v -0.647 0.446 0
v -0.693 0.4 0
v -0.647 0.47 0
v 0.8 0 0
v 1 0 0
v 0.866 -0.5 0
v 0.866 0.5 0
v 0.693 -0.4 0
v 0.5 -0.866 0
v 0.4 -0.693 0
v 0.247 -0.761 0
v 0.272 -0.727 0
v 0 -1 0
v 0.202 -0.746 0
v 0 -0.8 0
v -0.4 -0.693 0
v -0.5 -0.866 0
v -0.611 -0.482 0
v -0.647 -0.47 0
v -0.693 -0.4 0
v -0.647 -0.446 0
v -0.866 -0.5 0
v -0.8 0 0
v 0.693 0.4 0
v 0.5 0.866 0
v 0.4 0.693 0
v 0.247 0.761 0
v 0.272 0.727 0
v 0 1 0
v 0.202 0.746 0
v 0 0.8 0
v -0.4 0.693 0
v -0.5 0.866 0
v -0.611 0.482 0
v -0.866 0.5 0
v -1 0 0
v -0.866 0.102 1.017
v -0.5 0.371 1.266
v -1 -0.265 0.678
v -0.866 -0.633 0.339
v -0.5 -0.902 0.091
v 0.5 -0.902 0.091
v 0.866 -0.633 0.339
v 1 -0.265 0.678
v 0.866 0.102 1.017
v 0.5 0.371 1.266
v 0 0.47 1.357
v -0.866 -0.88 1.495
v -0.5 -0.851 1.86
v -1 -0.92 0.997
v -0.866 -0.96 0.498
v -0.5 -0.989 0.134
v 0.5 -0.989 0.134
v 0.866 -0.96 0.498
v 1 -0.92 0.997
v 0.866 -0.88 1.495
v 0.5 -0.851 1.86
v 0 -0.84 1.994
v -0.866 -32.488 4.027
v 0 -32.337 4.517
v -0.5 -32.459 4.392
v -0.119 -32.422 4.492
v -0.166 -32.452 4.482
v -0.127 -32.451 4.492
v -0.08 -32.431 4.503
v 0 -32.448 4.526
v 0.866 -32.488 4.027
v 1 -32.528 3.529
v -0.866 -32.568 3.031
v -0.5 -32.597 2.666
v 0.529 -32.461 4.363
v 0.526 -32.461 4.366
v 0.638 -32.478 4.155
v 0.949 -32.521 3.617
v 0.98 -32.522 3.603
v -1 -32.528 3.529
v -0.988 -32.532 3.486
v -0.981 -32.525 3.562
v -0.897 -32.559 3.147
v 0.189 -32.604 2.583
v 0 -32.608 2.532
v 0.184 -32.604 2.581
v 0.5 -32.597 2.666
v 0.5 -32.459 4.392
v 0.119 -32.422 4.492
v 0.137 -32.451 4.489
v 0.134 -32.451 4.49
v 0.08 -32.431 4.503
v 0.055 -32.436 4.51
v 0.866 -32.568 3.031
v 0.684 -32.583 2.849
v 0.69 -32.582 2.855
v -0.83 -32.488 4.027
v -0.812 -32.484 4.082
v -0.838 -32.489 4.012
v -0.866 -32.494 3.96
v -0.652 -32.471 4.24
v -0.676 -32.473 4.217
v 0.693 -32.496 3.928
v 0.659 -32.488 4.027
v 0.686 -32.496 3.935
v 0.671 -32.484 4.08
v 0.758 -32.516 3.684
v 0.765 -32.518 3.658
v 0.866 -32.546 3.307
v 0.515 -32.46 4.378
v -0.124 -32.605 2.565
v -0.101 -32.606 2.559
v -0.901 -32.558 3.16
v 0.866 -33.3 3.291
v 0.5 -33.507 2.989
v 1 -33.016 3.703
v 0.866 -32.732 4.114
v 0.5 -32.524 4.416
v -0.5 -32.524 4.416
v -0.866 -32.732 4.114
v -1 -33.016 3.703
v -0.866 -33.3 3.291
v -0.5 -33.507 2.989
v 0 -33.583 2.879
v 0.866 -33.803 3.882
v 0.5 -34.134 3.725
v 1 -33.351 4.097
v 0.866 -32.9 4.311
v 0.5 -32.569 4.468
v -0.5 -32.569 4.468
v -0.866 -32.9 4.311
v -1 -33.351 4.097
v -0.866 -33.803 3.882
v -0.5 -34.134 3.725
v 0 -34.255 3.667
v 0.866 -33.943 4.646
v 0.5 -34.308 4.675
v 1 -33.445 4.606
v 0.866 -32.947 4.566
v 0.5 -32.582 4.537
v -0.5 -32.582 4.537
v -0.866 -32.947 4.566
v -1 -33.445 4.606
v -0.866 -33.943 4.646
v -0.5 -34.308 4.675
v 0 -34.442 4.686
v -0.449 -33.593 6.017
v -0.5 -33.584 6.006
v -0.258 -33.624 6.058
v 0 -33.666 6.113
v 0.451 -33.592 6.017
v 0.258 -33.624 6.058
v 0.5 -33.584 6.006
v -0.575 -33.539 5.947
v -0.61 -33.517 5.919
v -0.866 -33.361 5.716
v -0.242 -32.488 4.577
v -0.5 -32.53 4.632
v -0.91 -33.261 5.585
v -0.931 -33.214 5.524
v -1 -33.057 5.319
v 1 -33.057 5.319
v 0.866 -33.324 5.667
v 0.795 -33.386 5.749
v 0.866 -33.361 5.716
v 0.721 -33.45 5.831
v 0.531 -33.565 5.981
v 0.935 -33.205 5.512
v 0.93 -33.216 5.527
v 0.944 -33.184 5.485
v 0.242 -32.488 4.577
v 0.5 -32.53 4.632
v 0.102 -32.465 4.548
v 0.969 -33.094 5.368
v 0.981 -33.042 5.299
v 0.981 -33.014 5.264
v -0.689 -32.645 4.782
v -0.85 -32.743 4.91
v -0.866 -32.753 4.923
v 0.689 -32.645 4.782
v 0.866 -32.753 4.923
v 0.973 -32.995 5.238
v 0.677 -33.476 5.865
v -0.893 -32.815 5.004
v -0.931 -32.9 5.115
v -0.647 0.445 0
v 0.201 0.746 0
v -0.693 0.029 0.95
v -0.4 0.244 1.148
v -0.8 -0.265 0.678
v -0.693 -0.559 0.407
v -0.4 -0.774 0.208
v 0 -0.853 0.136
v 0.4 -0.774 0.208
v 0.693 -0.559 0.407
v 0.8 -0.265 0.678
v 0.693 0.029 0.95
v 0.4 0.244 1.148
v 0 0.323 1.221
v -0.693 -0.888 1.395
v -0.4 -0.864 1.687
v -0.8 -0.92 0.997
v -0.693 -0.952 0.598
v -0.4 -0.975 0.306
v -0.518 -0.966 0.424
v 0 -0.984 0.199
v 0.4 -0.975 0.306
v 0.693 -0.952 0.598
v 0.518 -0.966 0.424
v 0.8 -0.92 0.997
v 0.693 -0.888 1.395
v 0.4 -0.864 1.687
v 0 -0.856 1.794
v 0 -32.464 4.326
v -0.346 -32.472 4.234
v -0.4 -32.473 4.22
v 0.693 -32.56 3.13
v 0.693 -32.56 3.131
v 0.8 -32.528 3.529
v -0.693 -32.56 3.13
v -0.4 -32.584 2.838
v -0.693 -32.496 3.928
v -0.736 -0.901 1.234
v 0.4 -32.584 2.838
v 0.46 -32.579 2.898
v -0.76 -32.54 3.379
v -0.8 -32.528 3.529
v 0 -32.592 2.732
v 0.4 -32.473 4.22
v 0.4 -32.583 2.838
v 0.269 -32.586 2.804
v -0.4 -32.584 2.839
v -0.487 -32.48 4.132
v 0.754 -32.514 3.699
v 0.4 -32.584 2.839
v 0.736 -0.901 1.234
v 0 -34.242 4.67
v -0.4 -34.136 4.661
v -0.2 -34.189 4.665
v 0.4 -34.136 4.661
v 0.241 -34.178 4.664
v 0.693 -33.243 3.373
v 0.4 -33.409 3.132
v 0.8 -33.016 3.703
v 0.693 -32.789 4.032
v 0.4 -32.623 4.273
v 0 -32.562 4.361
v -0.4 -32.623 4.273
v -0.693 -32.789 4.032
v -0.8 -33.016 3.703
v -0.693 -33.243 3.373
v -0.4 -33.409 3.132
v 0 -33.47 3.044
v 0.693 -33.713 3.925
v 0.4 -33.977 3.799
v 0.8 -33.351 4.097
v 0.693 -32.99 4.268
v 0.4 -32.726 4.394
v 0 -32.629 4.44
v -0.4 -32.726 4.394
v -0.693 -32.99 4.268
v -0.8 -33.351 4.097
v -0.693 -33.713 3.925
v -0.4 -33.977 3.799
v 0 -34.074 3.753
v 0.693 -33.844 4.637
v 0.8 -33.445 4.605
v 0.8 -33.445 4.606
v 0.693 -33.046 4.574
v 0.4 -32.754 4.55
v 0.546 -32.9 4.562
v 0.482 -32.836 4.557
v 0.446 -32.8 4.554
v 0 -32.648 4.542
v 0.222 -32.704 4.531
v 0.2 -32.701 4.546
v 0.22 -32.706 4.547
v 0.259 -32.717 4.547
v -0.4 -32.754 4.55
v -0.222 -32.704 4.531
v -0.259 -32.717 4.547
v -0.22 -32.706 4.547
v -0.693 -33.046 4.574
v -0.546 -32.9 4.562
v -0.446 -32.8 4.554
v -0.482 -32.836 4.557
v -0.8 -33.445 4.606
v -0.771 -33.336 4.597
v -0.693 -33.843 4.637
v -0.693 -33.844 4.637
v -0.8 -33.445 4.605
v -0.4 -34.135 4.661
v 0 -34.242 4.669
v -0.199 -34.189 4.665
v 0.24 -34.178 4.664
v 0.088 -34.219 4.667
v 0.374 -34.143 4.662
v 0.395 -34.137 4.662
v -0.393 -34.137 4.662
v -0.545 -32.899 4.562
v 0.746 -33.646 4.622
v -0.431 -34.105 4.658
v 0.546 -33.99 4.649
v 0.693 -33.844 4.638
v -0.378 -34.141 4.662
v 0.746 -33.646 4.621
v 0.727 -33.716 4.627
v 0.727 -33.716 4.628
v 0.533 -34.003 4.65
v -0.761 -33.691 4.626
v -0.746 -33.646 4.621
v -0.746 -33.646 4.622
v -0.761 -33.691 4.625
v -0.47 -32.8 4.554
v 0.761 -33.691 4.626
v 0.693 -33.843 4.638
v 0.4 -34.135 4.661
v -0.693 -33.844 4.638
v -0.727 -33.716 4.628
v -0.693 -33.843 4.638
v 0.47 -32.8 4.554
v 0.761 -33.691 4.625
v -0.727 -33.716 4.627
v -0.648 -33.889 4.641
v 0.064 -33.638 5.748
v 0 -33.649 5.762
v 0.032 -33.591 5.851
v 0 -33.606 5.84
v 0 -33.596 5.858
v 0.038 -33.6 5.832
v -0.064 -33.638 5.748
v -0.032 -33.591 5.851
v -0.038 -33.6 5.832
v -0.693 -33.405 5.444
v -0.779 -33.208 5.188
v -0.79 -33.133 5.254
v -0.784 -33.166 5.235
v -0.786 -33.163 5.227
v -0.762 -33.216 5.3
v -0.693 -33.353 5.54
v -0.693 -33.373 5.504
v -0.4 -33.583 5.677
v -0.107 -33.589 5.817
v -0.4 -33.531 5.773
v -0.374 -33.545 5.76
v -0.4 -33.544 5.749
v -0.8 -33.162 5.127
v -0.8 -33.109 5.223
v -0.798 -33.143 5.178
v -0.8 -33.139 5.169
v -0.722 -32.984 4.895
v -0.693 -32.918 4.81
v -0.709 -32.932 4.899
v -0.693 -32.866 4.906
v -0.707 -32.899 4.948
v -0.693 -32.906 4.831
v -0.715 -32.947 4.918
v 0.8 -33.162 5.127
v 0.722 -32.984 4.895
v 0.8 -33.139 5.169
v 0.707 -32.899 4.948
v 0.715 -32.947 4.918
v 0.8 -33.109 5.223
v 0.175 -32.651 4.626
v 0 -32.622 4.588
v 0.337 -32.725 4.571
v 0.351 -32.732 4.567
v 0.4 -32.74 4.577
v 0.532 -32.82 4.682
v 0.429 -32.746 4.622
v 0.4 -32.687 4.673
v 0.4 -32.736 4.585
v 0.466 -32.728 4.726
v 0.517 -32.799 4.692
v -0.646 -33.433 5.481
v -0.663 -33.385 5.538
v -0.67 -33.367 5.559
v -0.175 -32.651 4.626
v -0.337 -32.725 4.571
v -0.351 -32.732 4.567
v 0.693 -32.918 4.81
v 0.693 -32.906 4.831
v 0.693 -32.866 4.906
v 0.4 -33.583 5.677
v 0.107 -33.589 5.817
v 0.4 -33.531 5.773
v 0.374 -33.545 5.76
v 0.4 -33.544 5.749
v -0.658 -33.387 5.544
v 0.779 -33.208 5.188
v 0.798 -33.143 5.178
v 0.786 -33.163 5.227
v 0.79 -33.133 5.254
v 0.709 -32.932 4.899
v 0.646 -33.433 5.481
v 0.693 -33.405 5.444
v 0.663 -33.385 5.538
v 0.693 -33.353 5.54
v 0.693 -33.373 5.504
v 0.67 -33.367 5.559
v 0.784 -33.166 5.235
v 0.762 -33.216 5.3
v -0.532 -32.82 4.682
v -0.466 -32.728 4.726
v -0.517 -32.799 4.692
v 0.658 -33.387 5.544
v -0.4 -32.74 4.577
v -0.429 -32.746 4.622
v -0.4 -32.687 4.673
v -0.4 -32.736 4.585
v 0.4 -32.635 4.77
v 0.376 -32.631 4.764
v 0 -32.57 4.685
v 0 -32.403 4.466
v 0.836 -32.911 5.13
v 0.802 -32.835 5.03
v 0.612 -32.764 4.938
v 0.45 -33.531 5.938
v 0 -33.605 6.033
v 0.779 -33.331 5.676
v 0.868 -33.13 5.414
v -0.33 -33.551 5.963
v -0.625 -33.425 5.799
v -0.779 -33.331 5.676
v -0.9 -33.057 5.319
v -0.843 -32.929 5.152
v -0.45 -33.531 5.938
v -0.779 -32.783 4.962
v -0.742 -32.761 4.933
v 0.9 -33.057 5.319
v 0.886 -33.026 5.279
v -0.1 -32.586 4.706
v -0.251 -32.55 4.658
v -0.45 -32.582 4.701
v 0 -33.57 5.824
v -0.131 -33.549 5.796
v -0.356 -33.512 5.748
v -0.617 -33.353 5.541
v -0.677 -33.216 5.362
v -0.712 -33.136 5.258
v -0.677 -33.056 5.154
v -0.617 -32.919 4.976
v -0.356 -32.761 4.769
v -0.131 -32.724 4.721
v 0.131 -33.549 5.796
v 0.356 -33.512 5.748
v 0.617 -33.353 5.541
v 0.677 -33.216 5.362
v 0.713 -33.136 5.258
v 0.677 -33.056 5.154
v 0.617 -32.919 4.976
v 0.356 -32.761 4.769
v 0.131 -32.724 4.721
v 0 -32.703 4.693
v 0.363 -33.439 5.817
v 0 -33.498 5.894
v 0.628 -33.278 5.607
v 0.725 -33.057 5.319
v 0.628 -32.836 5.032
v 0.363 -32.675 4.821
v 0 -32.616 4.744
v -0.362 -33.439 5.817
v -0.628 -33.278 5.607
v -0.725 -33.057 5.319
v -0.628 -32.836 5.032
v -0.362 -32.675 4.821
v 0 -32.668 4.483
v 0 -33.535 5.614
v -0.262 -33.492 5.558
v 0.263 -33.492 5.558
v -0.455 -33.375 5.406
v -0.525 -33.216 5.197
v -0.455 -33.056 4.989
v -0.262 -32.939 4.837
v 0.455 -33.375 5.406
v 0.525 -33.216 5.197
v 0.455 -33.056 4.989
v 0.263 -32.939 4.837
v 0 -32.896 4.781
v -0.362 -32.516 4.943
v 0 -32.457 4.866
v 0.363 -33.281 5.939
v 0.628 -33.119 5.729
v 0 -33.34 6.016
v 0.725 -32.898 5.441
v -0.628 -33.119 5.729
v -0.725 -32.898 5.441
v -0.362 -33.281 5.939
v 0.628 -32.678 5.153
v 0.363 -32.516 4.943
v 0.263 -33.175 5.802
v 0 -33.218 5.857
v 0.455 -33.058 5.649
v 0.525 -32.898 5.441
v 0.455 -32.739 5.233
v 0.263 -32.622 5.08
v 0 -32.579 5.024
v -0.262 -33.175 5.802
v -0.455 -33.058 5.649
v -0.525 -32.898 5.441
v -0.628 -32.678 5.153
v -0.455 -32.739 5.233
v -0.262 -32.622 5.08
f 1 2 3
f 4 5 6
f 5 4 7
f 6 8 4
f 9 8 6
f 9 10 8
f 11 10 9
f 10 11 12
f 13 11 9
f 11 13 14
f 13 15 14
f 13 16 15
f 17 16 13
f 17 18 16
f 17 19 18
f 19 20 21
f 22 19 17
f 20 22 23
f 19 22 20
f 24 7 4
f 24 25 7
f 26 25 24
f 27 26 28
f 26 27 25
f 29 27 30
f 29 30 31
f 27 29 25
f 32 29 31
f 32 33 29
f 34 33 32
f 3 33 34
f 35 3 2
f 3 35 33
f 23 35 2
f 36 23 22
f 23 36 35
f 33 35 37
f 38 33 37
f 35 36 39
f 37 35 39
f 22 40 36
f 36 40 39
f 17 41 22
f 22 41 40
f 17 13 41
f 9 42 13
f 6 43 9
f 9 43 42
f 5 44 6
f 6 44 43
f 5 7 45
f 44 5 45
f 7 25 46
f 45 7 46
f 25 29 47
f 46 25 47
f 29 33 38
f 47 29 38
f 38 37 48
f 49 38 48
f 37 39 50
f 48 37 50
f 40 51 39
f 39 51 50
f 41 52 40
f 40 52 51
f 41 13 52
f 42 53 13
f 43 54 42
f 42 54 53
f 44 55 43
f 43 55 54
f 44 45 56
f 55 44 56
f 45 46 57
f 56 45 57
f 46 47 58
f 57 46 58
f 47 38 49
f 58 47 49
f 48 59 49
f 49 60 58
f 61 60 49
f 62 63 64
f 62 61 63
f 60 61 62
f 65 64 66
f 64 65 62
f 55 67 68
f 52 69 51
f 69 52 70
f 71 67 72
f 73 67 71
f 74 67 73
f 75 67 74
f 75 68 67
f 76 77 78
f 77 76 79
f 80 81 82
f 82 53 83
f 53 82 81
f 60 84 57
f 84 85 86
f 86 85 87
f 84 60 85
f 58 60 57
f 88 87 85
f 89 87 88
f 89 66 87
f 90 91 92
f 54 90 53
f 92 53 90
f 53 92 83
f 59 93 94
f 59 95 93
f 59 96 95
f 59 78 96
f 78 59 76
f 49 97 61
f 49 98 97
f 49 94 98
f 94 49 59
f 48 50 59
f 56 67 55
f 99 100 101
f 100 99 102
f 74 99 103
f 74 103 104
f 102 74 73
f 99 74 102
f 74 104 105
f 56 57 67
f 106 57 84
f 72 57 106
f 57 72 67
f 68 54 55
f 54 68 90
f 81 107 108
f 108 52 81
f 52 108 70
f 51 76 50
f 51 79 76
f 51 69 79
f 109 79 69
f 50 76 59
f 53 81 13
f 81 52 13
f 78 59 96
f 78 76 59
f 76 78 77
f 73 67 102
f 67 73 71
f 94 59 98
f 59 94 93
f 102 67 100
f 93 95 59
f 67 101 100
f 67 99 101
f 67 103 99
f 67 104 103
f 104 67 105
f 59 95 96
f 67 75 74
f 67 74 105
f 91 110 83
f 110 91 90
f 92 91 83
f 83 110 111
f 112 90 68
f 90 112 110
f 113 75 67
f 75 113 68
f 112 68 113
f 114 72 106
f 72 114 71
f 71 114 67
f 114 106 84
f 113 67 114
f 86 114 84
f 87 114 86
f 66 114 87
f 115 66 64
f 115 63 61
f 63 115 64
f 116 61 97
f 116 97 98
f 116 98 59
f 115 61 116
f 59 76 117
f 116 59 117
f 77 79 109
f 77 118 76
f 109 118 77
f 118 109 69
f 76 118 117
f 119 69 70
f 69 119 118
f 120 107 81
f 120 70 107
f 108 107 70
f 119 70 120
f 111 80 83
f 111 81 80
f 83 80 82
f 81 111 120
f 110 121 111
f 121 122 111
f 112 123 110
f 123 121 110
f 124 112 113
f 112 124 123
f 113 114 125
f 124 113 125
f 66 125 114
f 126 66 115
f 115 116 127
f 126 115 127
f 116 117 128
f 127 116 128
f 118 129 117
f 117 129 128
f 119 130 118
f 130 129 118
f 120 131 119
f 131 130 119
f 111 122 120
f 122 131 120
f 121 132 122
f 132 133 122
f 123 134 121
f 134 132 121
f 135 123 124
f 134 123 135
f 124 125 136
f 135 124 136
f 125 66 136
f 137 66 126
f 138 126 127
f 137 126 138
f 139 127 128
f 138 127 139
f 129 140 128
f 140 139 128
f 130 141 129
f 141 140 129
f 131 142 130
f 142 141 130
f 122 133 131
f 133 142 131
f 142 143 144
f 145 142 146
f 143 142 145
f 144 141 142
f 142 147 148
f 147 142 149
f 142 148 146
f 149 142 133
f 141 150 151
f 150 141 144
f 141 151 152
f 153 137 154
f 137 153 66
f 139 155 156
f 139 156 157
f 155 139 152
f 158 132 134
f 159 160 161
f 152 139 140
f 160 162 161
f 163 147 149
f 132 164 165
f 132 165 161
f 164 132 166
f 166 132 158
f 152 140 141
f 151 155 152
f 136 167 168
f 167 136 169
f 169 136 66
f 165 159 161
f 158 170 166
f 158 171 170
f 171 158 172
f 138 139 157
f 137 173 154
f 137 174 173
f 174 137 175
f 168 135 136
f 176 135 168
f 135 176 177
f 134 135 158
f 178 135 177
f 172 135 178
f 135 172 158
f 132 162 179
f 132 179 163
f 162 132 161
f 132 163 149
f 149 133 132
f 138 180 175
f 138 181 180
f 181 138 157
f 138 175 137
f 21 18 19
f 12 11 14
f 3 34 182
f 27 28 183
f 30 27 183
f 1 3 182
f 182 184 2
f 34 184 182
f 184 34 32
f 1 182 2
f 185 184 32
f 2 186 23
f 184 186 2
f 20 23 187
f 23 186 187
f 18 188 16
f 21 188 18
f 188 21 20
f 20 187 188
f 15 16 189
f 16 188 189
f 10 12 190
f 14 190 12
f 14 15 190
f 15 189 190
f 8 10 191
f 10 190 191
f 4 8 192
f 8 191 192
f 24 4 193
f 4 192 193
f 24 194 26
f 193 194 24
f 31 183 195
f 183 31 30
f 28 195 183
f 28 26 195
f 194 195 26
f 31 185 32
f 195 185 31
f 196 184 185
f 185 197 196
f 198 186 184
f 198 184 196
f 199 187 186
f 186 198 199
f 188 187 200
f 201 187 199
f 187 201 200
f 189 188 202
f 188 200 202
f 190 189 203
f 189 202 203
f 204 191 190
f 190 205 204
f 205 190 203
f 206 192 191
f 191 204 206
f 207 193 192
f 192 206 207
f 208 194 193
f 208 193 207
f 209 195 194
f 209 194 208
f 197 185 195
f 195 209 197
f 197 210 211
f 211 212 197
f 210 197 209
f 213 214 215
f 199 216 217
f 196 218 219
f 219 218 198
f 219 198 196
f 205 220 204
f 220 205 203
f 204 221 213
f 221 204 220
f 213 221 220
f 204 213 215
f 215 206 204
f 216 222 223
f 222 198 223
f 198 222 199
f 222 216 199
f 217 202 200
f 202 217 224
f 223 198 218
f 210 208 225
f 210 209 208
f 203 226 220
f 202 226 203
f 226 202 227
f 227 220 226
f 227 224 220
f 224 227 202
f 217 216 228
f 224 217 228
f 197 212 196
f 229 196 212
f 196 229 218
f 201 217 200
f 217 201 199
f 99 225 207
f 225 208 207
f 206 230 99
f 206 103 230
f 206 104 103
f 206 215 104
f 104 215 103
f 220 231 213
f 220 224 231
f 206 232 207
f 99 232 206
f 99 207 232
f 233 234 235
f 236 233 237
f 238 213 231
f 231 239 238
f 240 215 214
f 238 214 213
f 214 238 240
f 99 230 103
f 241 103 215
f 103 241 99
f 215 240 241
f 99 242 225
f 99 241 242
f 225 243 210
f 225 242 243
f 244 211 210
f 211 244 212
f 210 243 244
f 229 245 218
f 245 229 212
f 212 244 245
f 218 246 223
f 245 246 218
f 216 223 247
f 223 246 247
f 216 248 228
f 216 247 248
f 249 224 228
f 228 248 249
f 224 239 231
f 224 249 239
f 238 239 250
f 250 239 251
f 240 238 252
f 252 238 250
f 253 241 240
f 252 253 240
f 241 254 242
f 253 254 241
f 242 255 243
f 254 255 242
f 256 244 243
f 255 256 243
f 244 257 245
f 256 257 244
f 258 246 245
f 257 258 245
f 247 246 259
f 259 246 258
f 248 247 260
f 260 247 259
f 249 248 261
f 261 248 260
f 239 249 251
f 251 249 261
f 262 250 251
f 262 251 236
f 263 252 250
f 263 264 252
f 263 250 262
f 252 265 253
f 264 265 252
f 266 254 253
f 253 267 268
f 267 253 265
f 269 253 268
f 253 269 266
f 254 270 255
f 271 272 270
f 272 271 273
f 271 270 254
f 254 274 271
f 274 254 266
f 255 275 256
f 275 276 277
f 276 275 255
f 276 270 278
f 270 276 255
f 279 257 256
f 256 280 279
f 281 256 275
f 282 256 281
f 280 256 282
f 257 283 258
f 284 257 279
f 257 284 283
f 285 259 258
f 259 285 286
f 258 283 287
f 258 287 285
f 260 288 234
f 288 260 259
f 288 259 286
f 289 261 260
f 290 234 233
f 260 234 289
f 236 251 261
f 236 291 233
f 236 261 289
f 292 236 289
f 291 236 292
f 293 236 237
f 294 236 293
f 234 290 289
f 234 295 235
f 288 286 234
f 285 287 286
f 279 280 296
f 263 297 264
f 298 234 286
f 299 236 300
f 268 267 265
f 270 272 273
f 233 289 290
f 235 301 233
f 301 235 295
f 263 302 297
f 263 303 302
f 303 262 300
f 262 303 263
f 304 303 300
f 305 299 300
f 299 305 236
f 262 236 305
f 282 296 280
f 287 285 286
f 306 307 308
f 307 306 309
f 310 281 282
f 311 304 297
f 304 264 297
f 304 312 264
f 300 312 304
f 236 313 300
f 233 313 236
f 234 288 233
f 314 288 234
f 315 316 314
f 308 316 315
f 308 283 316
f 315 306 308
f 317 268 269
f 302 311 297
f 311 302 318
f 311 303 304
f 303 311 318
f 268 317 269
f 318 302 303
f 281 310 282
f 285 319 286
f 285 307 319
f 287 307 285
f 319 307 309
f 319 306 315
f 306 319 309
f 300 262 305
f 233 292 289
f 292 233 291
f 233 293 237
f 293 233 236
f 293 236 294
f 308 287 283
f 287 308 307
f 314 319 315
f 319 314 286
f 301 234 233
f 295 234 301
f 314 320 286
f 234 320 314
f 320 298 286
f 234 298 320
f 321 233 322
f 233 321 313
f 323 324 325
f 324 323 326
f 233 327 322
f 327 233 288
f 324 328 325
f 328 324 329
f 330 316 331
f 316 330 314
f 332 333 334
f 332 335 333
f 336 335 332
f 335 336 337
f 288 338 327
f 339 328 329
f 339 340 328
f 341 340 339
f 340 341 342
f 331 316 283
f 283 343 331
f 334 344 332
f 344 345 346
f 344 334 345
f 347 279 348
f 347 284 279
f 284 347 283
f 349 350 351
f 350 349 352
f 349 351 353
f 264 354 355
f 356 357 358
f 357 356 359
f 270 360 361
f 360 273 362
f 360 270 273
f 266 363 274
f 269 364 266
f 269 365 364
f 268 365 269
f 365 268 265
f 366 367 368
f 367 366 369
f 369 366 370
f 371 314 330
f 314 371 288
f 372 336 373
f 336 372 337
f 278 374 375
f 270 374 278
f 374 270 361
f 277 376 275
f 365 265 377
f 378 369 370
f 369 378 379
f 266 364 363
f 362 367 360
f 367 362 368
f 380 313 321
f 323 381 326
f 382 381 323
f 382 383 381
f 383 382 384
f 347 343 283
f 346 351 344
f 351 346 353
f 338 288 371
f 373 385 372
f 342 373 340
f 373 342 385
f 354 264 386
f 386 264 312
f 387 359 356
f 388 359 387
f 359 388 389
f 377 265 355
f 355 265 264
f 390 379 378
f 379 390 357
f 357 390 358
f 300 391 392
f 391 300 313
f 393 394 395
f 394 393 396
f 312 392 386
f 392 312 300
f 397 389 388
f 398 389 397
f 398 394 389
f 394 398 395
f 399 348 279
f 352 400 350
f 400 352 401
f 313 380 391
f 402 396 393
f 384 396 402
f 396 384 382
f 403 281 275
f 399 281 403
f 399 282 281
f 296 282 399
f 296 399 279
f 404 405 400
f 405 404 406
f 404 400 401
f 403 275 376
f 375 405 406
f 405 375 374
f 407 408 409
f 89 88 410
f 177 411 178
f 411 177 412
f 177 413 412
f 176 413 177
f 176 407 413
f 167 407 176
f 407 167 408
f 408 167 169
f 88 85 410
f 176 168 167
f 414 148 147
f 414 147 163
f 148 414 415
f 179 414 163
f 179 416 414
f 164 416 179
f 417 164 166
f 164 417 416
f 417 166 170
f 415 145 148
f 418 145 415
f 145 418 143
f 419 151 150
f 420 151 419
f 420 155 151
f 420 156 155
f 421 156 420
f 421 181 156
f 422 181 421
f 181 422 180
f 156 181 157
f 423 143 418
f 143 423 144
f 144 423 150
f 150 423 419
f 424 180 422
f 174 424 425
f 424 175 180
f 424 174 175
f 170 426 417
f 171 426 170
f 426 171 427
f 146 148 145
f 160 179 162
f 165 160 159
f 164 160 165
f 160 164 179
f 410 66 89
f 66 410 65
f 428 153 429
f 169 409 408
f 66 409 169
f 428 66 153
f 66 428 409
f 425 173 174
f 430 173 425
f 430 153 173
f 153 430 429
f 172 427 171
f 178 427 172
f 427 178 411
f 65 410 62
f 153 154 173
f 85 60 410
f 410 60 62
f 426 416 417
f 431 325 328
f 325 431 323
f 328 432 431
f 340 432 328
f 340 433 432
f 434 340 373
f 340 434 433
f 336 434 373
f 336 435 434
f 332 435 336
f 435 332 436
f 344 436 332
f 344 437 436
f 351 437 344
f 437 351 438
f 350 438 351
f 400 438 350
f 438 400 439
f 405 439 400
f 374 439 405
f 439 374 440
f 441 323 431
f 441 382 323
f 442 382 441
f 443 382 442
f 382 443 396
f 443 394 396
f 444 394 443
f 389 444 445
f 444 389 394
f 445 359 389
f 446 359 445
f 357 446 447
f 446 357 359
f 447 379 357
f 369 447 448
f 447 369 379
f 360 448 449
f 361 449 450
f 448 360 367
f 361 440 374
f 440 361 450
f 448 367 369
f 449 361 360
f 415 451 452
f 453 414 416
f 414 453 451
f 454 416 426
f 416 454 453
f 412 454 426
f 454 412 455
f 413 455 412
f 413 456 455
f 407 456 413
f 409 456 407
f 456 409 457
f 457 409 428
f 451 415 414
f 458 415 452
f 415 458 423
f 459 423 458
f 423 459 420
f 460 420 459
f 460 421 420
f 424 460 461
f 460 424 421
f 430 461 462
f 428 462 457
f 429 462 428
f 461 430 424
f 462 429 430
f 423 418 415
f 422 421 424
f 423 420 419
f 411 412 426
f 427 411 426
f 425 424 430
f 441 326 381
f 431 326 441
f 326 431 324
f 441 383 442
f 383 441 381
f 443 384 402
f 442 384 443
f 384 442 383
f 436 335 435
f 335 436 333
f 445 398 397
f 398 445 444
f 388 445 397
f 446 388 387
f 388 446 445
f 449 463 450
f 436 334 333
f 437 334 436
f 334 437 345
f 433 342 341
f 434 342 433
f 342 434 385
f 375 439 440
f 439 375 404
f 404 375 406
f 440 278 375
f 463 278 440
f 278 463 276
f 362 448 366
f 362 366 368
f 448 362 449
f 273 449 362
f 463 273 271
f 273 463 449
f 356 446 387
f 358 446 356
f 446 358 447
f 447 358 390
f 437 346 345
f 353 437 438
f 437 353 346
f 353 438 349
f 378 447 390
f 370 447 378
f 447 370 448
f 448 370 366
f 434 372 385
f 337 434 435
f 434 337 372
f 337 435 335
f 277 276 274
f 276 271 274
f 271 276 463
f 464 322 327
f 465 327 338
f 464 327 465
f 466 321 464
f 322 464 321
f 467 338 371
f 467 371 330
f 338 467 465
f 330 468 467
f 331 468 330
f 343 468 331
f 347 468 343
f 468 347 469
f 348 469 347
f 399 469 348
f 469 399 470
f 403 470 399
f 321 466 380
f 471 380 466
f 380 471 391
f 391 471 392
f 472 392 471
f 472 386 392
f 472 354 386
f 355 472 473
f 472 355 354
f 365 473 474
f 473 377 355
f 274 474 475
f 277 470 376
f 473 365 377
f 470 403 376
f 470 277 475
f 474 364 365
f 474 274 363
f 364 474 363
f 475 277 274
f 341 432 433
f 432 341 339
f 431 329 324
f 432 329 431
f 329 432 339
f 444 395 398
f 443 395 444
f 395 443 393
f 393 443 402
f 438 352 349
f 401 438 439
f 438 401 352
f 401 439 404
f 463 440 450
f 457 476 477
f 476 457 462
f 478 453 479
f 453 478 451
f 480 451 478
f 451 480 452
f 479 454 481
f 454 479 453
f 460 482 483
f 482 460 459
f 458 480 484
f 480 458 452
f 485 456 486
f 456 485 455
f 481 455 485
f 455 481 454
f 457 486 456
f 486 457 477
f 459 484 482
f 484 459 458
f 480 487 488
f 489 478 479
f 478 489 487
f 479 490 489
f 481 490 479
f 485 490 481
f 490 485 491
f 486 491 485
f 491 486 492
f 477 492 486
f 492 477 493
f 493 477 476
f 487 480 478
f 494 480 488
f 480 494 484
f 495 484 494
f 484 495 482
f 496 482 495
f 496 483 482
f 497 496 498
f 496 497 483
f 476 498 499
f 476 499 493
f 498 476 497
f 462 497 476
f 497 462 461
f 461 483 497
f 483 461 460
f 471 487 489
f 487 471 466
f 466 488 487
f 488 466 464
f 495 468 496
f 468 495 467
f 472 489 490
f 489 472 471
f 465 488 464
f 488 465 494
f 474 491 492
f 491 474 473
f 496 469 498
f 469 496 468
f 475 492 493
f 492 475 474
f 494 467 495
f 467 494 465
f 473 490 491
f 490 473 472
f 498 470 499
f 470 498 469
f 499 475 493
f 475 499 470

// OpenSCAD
tolerance=0.075;
hole_radius=0.05;
grid_hole_radius=0.05;
outer_radius=1;
thickness=0.2;
hole_attach_height=0.05;
attach_thickness=0.1;

//parameters that don't have to be defined explicitly
eps = tolerance/100;
inner_radius = outer_radius - thickness;
fn = 12;
fnh = 6;

module angled_cylinder(angle_deg_y, _h, _r, angle_deg_x = 0) {
    rotate([angle_deg_x, angle_deg_y, 0]) { // Rotate the cylinder 
            cylinder(h = _h, r = _r, center = true, $fn = fnh);
        }
}

module hole(_h) {
    cylinder(h = _h, r = grid_hole_radius, $fn = fnh);
}

//makes circle of holes
module circular_grid(_h, _r, _n) {
    for (i = [0:_n-1]) {
        angle = i * 360 / _n;
        x_pos = _r * cos(angle);
        y_pos = _r * sin(angle);
        translate([x_pos, y_pos, -eps]) {
            hole(_h);
        }
    }
}

//makes grid of holes
module hole_grid(hole_height, grid_h) {
    translate([0,0,hole_height]) {
        difference() {
            //cylinder
            cylinder(h = grid_h, r = (inner_radius + outer_radius)/2, 
                center=false, $fn = fn);
            //holes
            for (i = [0 : grid_hole_radius * 2 + hole_attach_height : inner_radius - grid_hole_radius * 2]) {
                circular_grid(grid_h + eps*2, i, ceil(6.28*i/(grid_hole_radius*4)));
            }
            
        } 
    }
}

//makes curve of CSC
module curve(_radius, _twist, _turning_angle, _turning_radius) {
    rotate([90,0,_twist])
    translate([-_turning_radius, 0, 0])
    rotate_extrude(angle=_turning_angle, convexity=100, $fn = fn)
    translate([_turning_radius, 0]) circle(_radius);
}

module CSC(_r, _t1, _ta1, _tr1, _h, _t2, _ta2, _tr2, is_inner) {
    
    if (_ta1 > 90) {
        CSC(_r, _t1, 90, _tr1, 0, 0, 0, 0, is_inner);
        
        pos1 = (-_tr1 + sqrt(_tr1*_tr1 - pow(_tr1,2)));
        translate([pos1*cos(_t1),pos1*sin(_t1),_tr1])
        rotate([0,-90,_t1])
        CSC(_r, 0, _ta1 - 90, _tr1, _h, _t2, _ta2, _tr2, is_inner);
    } else if (_ta2 > 90) {
        CSC(_r, _t1, _ta1, _tr1, _h, _t2, 90, _tr2, is_inner);
        
        pos1 = (-_tr1 + sqrt(_tr1*_tr1 - pow(_tr1*sin(_ta1),2)));
        pos2 = (-_tr2 + sqrt(_tr2*_tr2 - pow(_tr2,2)));
        translate([pos1*cos(_t1),pos1*sin(_t1),_tr1*sin(_ta1)])
        rotate([0,-_ta1,_t1])
        translate([0, 0, _h])
        translate([pos2*cos(_t2),pos2*sin(_t2),_tr2])
        rotate([0,-90,_t2])
        CSC(_r, 0, 0, 0, 0, 0, _ta2 - 90, _tr2, is_inner);
    } else {
        //intermediate positions
        pos1 = (-_tr1 + sqrt(_tr1*_tr1 - pow(_tr1*sin(_ta1),2)));
        pos2 = (-_tr2 + sqrt(_tr2*_tr2 - pow(_tr2*sin(_ta2),2)));
        
        union() {
            //bottom shell threshold
            if (is_inner) {
                cylinder(h=eps, r=_r, center=true);
            }
            
            //first curve of CSC
            curve(_r, _t1, _ta1, _tr1);
            
            //straight link of CSC
            translate([pos1*cos(_t1),pos1*sin(_t1),_tr1*sin(_ta1)])
            rotate([0,-_ta1,_t1])
            if (is_inner) {
                //add threshold for shelling
                translate([0,0,-eps /2])
                cylinder(h=_h + eps,r=_r, center = false, $fn= fn);
            } else {
                cylinder(h=_h,r=_r, center = false, $fn= fn);
            }
            
            //second curve of CSC
            translate([pos1*cos(_t1),pos1*sin(_t1),_tr1*sin(_ta1)])
            rotate([0,-_ta1,_t1])
            translate([0, 0, _h])
            curve(_r, _t2, _ta2, _tr2);
            
            //shelling thresholds
            if (is_inner) {
                translate([pos1*cos(_t1),pos1*sin(_t1),_tr1*sin(_ta1)])
                rotate([0,-_ta1,_t1])
                translate([0, 0, _h])
                translate([pos2*cos(_t2),pos2*sin(_t2),_tr2*sin(_ta2)])
                rotate([0,-_ta2,_t2]) {
                    cylinder(h=eps, r=_r, center=true,$fn=fn);
                }
            
            }
        }
    }
    
}

//allow modules to attach
module CSC_ATTACH(_r, _t1, _ta1, _tr1, _h, _t2, _ta2, _tr2, next_hole_radius, next_hole_attach_height, next_inner) {
    
    if (_ta1 > 90) {        
        pos1 = (-_tr1 + sqrt(_tr1*_tr1 - pow(_tr1,2)));
        translate([pos1*cos(_t1),pos1*sin(_t1),_tr1])
        rotate([0,-90,_t1])
        CSC_ATTACH(_r, 0, _ta1 - 90, _tr1, _h, _t2, _ta2, _tr2, next_hole_radius, next_hole_attach_height, next_inner);
    } else if (_ta2 > 90) {        
        pos1 = (-_tr1 + sqrt(_tr1*_tr1 - pow(_tr1*sin(_ta1),2)));
        pos2 = (-_tr2 + sqrt(_tr2*_tr2 - pow(_tr2,2)));
        translate([pos1*cos(_t1),pos1*sin(_t1),_tr1*sin(_ta1)])
        rotate([0,-_ta1,_t1])
        translate([0, 0, _h])
        translate([pos2*cos(_t2),pos2*sin(_t2),_tr2])
        rotate([0,-90,_t2])
        CSC_ATTACH(_r, 0, 0, 0, 0, 0, _ta2 - 90, _tr2, next_hole_radius, next_hole_attach_height, next_inner);
    } else {
        //intermediate positions
        pos1 = (-_tr1 + sqrt(_tr1*_tr1 - pow(_tr1*sin(_ta1),2)));
        pos2 = (-_tr2 + sqrt(_tr2*_tr2 - pow(_tr2*sin(_ta2),2)));
        
        translate([pos1*cos(_t1),pos1*sin(_t1),_tr1*sin(_ta1)])
        rotate([0,-_ta1,_t1])
        translate([0, 0, _h])
        translate([pos2*cos(_t2),pos2*sin(_t2),_tr2*sin(_ta2)])
        rotate([0,-_ta2,_t2]) {
            difference() {
                union() {
                    //attachment for smaller cylinder
                    translate([0,0,-attach_thickness])
                    cylinder(h=attach_thickness, r=_r - thickness/2, $fn=fn);
                    translate([0,0,-attach_thickness*2])
                    cylinder(h=attach_thickness*2, r1=_r - thickness/2, r2=next_inner - tolerance - thickness, $fn=fn);
                    
                    //small cylinder
                    cylinder(h=next_hole_radius*2 + next_hole_attach_height * 2, r = next_inner - tolerance, $fn=fn);
                }
                
                //shelling
                translate([0,0, -attach_thickness*2 - eps/2])
                cylinder(h=next_hole_radius*2 + next_hole_attach_height * 2 + attach_thickness*2 + eps, r = min(inner_radius, next_inner - tolerance - thickness), $fn=fn);
                
                //holes for screws
    //            translate([0,0,next_hole_attach_height + next_hole_radius]) {
    //                angled_cylinder(0, (next_inner + thickness + eps) * 2,  hole_radius, 90);
    //                angled_cylinder(90, (next_inner + thickness + eps) * 2, hole_radius, 0);
    //            }
            }
        }
    }
}

//remove overlap to allow all branches to attach to each other
module CSC_REMOVE_OVERLAP(_r, _t1, _ta1, _tr1, _h, _t2, _ta2, _tr2, next_hole_radius, next_hole_attach_height, next_inner) {
    if (_ta1 > 90) {        
        pos1 = (-_tr1 + sqrt(_tr1*_tr1 - pow(_tr1,2)));
        translate([pos1*cos(_t1),pos1*sin(_t1),_tr1])
        rotate([0,-90,_t1])
        CSC_REMOVE_OVERLAP(_r, 0, _ta1 - 90, _tr1, _h, _t2, _ta2, _tr2, next_hole_radius, next_hole_attach_height, next_inner);
    } else if (_ta2 > 90) {        
        pos1 = (-_tr1 + sqrt(_tr1*_tr1 - pow(_tr1*sin(_ta1),2)));
        pos2 = (-_tr2 + sqrt(_tr2*_tr2 - pow(_tr2,2)));
        translate([pos1*cos(_t1),pos1*sin(_t1),_tr1*sin(_ta1)])
        rotate([0,-_ta1,_t1])
        translate([0, 0, _h])
        translate([pos2*cos(_t2),pos2*sin(_t2),_tr2])
        rotate([0,-90,_t2])
        CSC_REMOVE_OVERLAP(_r, 0, 0, 0, 0, 0, _ta2 - 90, _tr2, next_hole_radius, next_hole_attach_height, next_inner);
    } else {
        pos1 = (-_tr1 + sqrt(_tr1*_tr1 - pow(_tr1*sin(_ta1),2)));
        pos2 = (-_tr2 + sqrt(_tr2*_tr2 - pow(_tr2*sin(_ta2),2)));
        
        translate([pos1*cos(_t1),pos1*sin(_t1),_tr1*sin(_ta1)])
        rotate([0,-_ta1,_t1])
        translate([0, 0, _h])
        translate([pos2*cos(_t2),pos2*sin(_t2),_tr2*sin(_ta2)])
        rotate([0,-_ta2,_t2]) {
            cylinder(h=999999, r=_r + tolerance, $fn=fn);
        }
    }
}

//c is _t1, _ta1, _tr1, _h, _t2, _ta2, _tr2, next hole radius, next hole height, next inner radius
module branch(branch_list, _outer, _inner) {
    union() {
        //make grid of holes
        //hole_grid(hole_radius*2 + hole_attach_height * 2, grid_hole_radius);
        
        //make CSC shells for each CSC in branch_list
        difference() {
            for (c = branch_list) {
                CSC(_outer,c[0],c[1],c[2],c[3],c[4],c[5],c[6], false);
            }
            
            for (c = branch_list) {
                CSC(_inner,c[0],c[1],c[2],c[3],c[4],c[5],c[6], true);
                CSC_REMOVE_OVERLAP(_outer,c[0],c[1],c[2],c[3],c[4],c[5],c[6],c[7], c[8], c[9]);
            }
            
            //make screw holes at the bottom
//            translate([0,0,hole_radius + hole_attach_height]) {
//                angled_cylinder(0, (outer_radius*1.5 + eps) * 2,  hole_radius, 90);
//                angled_cylinder(90, (outer_radius*1.5 + eps) * 2, hole_radius, 0);
//            }    
        }
        for (c=branch_list) {     
            CSC_ATTACH(_outer,c[0],c[1],c[2],c[3],c[4],c[5],c[6], c[7], c[8], c[9]);
        }
    }
}

branch([
[ 90.0, 85.4196, 1.0*outer_radius, 31.7092*outer_radius, 179.9999, 137.9196, 1.0*outer_radius, 0.05, 0.05, 0.8],
],outer_radius,inner_radius);
